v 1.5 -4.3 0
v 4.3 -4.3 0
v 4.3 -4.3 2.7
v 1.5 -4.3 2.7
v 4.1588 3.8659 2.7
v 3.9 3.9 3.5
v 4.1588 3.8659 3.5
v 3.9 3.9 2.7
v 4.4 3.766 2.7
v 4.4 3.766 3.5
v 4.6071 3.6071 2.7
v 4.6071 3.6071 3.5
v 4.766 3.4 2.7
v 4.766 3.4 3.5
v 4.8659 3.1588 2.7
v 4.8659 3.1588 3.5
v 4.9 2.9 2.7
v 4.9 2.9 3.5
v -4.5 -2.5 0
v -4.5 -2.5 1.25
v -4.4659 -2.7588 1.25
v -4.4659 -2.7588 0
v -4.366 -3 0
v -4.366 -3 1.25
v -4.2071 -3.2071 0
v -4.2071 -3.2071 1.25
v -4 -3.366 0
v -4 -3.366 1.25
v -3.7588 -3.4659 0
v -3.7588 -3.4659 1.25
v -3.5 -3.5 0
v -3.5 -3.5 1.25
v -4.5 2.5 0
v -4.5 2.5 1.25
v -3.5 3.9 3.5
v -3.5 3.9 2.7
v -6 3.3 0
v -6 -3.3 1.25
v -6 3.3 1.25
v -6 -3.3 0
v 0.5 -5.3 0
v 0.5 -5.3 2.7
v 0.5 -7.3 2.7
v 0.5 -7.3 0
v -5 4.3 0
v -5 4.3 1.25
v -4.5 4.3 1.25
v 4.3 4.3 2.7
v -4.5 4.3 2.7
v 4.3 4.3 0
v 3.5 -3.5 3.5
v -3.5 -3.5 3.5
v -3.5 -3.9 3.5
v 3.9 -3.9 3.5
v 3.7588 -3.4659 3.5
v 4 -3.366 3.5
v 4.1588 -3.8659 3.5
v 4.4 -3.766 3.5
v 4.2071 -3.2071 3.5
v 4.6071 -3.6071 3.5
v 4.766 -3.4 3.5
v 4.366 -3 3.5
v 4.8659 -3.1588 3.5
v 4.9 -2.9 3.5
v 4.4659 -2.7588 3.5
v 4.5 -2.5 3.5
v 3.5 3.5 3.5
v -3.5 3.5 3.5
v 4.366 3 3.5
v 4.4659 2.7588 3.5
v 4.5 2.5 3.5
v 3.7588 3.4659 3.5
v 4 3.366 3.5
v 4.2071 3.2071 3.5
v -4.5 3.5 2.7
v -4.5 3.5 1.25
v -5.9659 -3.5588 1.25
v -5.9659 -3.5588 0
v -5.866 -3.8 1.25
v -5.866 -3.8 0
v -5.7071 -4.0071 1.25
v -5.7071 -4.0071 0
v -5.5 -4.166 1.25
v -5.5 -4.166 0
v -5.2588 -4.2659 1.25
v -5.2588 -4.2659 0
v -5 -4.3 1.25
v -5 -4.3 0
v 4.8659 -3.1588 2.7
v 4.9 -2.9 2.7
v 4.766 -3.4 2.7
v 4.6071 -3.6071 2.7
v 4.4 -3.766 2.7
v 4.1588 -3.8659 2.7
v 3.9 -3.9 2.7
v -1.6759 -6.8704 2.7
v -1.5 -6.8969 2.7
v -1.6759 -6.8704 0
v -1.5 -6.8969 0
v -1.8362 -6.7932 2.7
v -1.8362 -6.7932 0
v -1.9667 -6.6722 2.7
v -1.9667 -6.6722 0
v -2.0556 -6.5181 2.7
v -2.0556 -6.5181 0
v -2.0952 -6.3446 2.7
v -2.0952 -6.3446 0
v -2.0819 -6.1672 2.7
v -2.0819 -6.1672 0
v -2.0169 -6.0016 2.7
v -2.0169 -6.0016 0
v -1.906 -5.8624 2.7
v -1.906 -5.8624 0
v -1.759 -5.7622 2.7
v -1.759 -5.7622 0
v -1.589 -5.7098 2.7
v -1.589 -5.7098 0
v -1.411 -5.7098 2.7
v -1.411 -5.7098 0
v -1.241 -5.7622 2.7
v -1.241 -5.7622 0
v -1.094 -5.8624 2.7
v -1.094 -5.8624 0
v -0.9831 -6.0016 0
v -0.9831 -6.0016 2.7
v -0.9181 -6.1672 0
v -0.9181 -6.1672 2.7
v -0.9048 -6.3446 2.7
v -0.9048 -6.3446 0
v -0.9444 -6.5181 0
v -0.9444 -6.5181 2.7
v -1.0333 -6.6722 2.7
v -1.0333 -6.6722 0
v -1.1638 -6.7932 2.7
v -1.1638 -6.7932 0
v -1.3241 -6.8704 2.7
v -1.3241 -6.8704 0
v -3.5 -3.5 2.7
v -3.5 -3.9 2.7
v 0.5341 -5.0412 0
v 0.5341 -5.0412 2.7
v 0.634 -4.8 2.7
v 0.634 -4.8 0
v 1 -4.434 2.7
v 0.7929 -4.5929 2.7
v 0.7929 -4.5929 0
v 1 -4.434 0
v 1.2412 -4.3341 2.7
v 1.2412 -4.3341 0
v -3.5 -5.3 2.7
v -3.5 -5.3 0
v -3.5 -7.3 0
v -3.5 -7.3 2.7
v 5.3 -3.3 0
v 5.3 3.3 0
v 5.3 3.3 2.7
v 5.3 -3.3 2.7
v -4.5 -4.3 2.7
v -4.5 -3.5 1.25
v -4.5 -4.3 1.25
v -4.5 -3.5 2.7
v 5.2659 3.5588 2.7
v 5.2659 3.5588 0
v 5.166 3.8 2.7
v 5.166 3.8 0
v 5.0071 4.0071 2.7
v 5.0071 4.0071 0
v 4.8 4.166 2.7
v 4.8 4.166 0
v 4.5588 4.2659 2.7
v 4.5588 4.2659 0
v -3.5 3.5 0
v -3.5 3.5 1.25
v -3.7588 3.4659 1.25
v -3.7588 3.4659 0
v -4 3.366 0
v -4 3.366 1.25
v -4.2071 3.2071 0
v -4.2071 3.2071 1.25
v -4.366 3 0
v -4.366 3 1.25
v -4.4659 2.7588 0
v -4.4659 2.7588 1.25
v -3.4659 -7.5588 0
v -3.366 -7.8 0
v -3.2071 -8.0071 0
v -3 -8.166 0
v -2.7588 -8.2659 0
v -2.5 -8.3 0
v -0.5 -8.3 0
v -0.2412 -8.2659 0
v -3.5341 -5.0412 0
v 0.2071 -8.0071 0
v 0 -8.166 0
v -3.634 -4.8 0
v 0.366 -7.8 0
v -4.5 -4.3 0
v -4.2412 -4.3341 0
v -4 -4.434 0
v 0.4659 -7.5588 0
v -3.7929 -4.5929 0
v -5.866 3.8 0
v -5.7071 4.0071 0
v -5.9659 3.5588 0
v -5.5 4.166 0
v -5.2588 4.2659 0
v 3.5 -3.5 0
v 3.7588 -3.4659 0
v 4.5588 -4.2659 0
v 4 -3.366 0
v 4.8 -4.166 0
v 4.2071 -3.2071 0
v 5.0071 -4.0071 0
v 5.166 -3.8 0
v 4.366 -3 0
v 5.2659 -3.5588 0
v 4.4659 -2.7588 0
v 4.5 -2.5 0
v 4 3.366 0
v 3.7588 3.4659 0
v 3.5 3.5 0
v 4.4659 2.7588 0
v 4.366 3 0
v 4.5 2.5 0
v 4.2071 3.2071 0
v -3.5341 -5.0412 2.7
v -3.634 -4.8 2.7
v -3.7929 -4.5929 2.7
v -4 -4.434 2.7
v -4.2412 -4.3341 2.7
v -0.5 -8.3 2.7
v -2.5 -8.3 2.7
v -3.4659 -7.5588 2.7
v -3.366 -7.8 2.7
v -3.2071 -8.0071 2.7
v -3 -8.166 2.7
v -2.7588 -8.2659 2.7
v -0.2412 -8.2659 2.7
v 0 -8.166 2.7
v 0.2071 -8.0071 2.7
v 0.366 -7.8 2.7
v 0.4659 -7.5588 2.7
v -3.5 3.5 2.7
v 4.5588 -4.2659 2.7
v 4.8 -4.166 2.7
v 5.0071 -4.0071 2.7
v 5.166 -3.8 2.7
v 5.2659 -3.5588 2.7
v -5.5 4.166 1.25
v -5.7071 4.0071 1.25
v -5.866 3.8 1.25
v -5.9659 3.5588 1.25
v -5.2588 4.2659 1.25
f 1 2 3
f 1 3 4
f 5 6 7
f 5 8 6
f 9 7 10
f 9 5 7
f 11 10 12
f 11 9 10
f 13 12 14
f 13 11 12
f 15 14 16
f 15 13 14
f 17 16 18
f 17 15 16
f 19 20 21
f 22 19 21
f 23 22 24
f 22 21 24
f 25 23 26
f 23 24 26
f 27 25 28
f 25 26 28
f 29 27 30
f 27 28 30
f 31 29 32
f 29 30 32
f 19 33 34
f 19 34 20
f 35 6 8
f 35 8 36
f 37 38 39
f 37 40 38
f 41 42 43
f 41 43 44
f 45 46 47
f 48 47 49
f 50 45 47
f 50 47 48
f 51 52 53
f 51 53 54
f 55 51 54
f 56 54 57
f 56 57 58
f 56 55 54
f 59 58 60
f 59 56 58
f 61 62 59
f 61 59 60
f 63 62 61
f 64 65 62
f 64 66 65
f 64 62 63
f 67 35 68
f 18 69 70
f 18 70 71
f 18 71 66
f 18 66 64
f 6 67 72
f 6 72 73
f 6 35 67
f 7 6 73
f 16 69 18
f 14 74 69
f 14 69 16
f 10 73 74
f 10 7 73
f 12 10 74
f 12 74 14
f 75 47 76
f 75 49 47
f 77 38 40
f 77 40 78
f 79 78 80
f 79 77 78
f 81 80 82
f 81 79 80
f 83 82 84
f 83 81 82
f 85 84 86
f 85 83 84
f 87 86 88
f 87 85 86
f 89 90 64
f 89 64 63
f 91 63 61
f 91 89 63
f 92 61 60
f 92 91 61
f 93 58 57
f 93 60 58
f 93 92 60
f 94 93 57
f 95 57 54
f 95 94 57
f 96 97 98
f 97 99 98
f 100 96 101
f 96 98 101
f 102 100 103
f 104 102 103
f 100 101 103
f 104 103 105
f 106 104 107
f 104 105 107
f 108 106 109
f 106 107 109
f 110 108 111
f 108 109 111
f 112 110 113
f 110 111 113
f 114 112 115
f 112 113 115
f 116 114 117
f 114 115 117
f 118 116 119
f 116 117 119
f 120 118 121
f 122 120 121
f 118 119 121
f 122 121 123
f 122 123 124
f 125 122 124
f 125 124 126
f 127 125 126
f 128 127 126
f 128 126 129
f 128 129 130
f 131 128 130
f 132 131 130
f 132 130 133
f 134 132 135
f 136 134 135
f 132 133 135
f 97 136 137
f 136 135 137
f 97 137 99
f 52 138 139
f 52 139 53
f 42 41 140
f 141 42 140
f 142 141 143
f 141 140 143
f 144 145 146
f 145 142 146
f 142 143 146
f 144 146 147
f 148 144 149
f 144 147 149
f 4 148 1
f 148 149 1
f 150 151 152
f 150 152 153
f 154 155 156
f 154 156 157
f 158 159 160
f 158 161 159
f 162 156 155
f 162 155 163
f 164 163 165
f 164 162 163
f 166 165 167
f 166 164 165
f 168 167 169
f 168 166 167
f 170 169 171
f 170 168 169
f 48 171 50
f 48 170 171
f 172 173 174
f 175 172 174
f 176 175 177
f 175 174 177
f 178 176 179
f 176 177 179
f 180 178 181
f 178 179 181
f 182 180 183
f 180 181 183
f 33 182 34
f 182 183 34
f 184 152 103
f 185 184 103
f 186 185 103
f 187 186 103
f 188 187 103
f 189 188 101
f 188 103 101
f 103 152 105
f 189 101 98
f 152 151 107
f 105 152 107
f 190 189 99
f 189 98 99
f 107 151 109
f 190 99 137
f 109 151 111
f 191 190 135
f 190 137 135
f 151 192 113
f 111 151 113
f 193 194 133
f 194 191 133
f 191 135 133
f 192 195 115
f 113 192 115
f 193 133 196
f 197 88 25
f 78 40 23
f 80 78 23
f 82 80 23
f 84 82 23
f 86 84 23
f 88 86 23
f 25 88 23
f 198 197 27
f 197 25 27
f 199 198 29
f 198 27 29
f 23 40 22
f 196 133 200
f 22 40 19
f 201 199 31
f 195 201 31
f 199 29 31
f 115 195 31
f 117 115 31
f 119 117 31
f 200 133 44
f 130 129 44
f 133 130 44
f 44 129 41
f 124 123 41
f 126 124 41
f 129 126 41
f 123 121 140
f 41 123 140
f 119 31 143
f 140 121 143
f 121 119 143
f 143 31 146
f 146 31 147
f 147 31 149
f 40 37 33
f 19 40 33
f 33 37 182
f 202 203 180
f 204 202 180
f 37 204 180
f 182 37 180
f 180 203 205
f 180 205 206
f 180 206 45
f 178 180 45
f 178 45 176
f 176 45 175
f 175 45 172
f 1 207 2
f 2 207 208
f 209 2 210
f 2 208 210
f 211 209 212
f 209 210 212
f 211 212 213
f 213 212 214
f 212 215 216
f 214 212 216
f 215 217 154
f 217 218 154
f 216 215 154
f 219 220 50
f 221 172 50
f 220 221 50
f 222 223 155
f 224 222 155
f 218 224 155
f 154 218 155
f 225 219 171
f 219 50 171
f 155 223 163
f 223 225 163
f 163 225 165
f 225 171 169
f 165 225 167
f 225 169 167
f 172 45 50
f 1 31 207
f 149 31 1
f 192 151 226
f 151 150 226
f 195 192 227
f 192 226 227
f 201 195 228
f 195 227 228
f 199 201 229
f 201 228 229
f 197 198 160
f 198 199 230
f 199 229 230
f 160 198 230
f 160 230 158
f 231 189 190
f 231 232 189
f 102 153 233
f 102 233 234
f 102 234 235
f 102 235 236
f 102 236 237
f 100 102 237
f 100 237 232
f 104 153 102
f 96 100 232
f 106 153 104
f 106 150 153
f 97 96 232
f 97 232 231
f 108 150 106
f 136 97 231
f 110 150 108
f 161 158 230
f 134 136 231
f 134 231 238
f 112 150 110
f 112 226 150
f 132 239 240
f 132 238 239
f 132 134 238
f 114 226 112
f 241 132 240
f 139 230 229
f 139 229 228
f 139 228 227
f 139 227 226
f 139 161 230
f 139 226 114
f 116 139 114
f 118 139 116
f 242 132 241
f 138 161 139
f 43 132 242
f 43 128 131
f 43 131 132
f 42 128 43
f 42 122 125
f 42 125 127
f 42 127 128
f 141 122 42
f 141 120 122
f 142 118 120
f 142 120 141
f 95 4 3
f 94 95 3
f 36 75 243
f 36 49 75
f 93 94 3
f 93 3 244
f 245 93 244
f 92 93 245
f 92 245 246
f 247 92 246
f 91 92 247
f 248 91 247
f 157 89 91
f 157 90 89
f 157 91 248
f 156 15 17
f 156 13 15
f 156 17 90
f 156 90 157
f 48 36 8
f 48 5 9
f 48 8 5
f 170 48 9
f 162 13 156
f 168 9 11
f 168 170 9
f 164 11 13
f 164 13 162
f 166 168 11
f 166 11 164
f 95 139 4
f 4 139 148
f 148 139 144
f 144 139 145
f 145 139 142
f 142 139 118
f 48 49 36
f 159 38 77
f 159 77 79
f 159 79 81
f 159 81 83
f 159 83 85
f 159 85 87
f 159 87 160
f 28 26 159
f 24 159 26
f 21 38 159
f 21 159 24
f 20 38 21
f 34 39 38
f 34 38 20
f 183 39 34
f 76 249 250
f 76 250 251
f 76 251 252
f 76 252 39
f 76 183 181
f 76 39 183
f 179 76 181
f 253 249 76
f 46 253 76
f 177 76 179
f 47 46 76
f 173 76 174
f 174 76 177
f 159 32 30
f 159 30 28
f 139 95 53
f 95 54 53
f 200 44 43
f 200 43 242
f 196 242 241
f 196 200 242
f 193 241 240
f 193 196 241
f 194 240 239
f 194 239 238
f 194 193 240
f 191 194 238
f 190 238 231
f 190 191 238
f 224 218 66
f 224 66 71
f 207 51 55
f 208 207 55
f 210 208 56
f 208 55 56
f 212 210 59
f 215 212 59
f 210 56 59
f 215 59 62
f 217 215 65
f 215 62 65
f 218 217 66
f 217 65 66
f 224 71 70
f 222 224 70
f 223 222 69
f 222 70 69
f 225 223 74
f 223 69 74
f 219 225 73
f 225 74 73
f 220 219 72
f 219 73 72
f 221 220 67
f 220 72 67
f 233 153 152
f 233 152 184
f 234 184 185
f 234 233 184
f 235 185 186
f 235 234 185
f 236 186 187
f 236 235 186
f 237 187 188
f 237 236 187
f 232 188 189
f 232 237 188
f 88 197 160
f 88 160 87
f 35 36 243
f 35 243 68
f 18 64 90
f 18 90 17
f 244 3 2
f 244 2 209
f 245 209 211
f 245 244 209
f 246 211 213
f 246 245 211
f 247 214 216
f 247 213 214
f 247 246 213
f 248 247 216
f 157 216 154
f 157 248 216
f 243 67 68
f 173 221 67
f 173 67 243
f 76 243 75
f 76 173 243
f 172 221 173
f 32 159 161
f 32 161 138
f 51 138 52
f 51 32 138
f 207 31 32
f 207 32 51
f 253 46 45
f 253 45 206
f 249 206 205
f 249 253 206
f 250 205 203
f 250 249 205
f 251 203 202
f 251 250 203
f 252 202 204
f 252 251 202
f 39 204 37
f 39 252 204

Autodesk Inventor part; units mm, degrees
ref_plane "YZ Plane" through (0, 0, 0) normal (1, 0, 0) x (0, 1, 0)
ref_plane "XZ Plane" through (0, 0, 0) normal (0, 1, 0) x (-1, 0, 0)
ref_plane "XY Plane" through (0, 0, 0) normal (0, 0, 1) x (1, 0, 0)
sketch "Sketch1" plane through (0, 0, 0) normal (0, 0, 1) x (1, 0, 0)
  circle A0 centre (0, 0) radius 3.5 construction
  circle A1 centre (0, 0) radius 4.5 construction
  line L0 (0, 0) -> (4.5, 0) construction
  line L1 (4.5, 0) -> (4.5, 3.5) construction
  line L2 (4.5, 3.5) -> (0, 3.5) construction
  line L3 (0, 3.5) -> (0, 0) construction
  line L4 (4.5, 3.5) -> (-4.5, 3.5)
  line L5 (-4.5, 3.5) -> (-4.5, -3.5)
  line L6 (-4.5, -3.5) -> (4.5, -3.5)
  line L7 (4.5, -3.5) -> (4.5, 3.5)
  line L8 (-4.5, 3.5) -> (-6, 3.5) construction
  line L9 (-6, 3.5) -> (-6, -3.5) construction
  line L10 (-6, -3.5) -> (-4.5, -3.5) construction
  line L11 (-4.5, -3.5) -> (-4.5, 3.5) construction
  line L12 (-6, 3.5) -> (4.5, 3.5) construction
  line L13 (4.5, 3.5) -> (4.5, 4.3) construction
  line L14 (4.5, 4.3) -> (-6, 4.3) construction
  line L15 (-6, 4.3) -> (-6, 3.5) construction
  line L16 (-6, -3.5) -> (4.5, -3.5) construction
  line L17 (4.5, -3.5) -> (4.5, -4.3) construction
  line L18 (4.5, -4.3) -> (-6, -4.3) construction
  line L19 (-6, -4.3) -> (-6, -3.5) construction
  line L20 (4.5, -4.3) -> (5.3, -4.3) construction
  line L21 (5.3, -4.3) -> (5.3, 4.3) construction
  line L22 (5.3, 4.3) -> (4.5, 4.3) construction
  line L23 (4.5, 4.3) -> (4.5, -4.3) construction
  line L24 (-6, 4.3) -> (5.3, 4.3)
  line L25 (5.3, 4.3) -> (5.3, -4.3)
  line L26 (5.3, -4.3) -> (-6, -4.3)
  line L27 (-6, -4.3) -> (-6, 4.3)
  dimension "d0" = 7
  dimension "d1" = 9
  dimension "d2" = 4.5
  dimension "d3" = 3.5
  dimension "d4" = 1.5
  dimension "d5" = 0.8
  dimension "d6" = 0.8
  dimension "d7" = 0.8
extrude "Extrusion1" add sketch "Sketch1" along normal blind 3.5
sketch "Sketch2" plane through (0, 0, 3.5) normal (0, 0, 1) x (1, 0, 0)
  line L0 (5.3, -4.3) -> (-6, -4.3) projected
  line L1 (-6, 4.3) -> (-4.5, 4.3)
  line L2 (-4.5, 4.3) -> (-4.5, -4.3)
  line L3 (-4.5, -4.3) -> (-6, -4.3)
  line L4 (-6, -4.3) -> (-6, 4.3)
  point P0 (0, 0)
extrude "Extrusion2" cut sketch "Sketch2" against normal blind 2.25
sketch "Sketch3" plane through (0, 0, 3.5) normal (0, 0, 1) x (1, 0, 0)
  line L0 (-4.5, -3.5) -> (-4.5, -4.3) projected
  line L1 (5.3, -4.3) -> (-4.5, -4.3) projected
  line L2 (5.3, 4.3) -> (5.3, -4.3) projected
  line L3 (-4.5, 4.3) -> (5.3, 4.3) construction
  line L4 (5.3, 4.3) -> (5.3, 3.9) construction
  line L5 (5.3, 3.9) -> (-4.5, 3.9) construction
  line L6 (-4.5, 3.9) -> (-4.5, 4.3) construction
  line L7 (5.3, 4.3) -> (4.9, 4.3) construction
  line L8 (4.9, 4.3) -> (4.9, -4.3) construction
  line L9 (4.9, -4.3) -> (5.3, -4.3) construction
  line L10 (5.3, -4.3) -> (5.3, 4.3) construction
  line L11 (5.3, -4.3) -> (-4.5, -4.3) construction
  line L12 (-4.5, -4.3) -> (-4.5, -3.9) construction
  line L13 (-4.5, -3.9) -> (5.3, -3.9) construction
  line L14 (5.3, -3.9) -> (5.3, -4.3) construction
  line L15 (-4.5, 3.9) -> (-4.5, 4.3)
  line L16 (5.3, 4.3) -> (5.3, -4.3)
  line L17 (-4.5, -4.3) -> (-4.5, -3.9)
  line L18 (4.9, -3.9) -> (4.9, 3.9)
  line L19 (4.9, 3.9) -> (-4.5, 3.9)
  line L20 (-4.5, 4.3) -> (5.3, 4.3)
  line L21 (4.9, -3.9) -> (-4.5, -3.9)
  line L22 (-4.5, -4.3) -> (5.3, -4.3)
  point P0 (0, 0)
  dimension "d12" = 0.4
  dimension "d13" = 0.4
  dimension "d14" = 0.4
extrude "Extrusion3" cut sketch "Sketch3" against normal blind 0.8
sketch "Sketch4" plane through (-6, -4.3, 0) normal (0, -1, 0) x (1, 0, 0)
  line L0 (11.3, 2.7) -> (1.5, 2.7) projected
  line L1 (11.3, 0) -> (0, 0) projected
  line L2 (12.285, 1.4959) -> (-1.3636, 1.4959) construction
  line L3 (6, 1.4959) -> (8, 1.4959) construction
  line L4 (8, 2.7) -> (6, 2.7) construction
  line L5 (8, 2.7) -> (4, 2.7)
  line L6 (1.5, 2.7) -> (2.5, 2.7) construction
  line L7 (2.5, 2.7) -> (2.5, 0) construction
  line L8 (2.5, 0) -> (1.5, 0) construction
  line L9 (1.5, 0) -> (1.5, 2.7) construction
  line L10 (2.5, 2.7) -> (6.5, 2.7)
  line L11 (6.5, 2.7) -> (6.5, 0)
  line L12 (6.5, 0) -> (2.5, 0)
  line L13 (2.5, 0) -> (2.5, 2.7)
  point P0 (6, 0)
  point P1 (4, 0)
  dimension "d29" = 1
  dimension "d30" = 4
extrude "Extrusion4" add sketch "Sketch4" along normal blind 4
fillet "Fillet1" radius 1 14 edges at (5.3, -4.3, 1.35) (4.9, -3.9, 3.1) (-6, -4.3, 0.625) (-6, 4.3, 0.625) (4.9, 3.9, 3.1) (5.3, 4.3, 1.35) (-3.5, -4.3, 1.35) (0.5, -4.3, 1.35) (0.5, -8.3, 1.35) (-3.5, -8.3, 1.35) (4.5, 3.5, 1.75) (4.5, -3.5, 1.75) (-4.5, 3.5, 0.625) (-4.5, -3.5, 0.625)
sketch "Sketch6" plane through (0, 0, 2.7) normal (0, 0, 1) x (1, 0, 0)
  point P0 (0, 0)
  point P1 (-1.5, -6.3)
hole "Hole2" at (-1.5, -6.3, 2.7) direction (0, 0, -1) diameter 1.1938 end through all
sketch "Sketch7" plane through (-4.5, 3.5, 1.25) normal (-1, 0, 0) x (0, 0, 1)
  line L0 (0, 0) -> (2.25, 0) projected
  line L1 (2.25, 0.4) -> (1.45, 0.4)
  line L2 (1.45, 0.4) -> (1.45, 0)
  line L3 (1.45, 0) -> (2.25, 0)
  line L4 (2.25, 0) -> (2.25, 0.4)
  point P0 (-1.25, -3.5)
extrude "Extrusion5" cut sketch "Sketch7" against normal blind 1
sketch "Sketch8" plane through (-4.5, -3.5, 1.25) normal (-1, 0, 0) x (0, 0, 1)
  line L0 (2.25, 0) -> (1.45, 0)
  line L1 (1.45, 0) -> (1.45, -0.4)
  line L2 (1.45, -0.4) -> (2.25, -0.4)
  line L3 (2.25, -0.4) -> (2.25, 0)
  point P0 (-1.25, 3.5)
extrude "Extrusion6" cut sketch "Sketch8" against normal blind 1
properties part number "window_f"
